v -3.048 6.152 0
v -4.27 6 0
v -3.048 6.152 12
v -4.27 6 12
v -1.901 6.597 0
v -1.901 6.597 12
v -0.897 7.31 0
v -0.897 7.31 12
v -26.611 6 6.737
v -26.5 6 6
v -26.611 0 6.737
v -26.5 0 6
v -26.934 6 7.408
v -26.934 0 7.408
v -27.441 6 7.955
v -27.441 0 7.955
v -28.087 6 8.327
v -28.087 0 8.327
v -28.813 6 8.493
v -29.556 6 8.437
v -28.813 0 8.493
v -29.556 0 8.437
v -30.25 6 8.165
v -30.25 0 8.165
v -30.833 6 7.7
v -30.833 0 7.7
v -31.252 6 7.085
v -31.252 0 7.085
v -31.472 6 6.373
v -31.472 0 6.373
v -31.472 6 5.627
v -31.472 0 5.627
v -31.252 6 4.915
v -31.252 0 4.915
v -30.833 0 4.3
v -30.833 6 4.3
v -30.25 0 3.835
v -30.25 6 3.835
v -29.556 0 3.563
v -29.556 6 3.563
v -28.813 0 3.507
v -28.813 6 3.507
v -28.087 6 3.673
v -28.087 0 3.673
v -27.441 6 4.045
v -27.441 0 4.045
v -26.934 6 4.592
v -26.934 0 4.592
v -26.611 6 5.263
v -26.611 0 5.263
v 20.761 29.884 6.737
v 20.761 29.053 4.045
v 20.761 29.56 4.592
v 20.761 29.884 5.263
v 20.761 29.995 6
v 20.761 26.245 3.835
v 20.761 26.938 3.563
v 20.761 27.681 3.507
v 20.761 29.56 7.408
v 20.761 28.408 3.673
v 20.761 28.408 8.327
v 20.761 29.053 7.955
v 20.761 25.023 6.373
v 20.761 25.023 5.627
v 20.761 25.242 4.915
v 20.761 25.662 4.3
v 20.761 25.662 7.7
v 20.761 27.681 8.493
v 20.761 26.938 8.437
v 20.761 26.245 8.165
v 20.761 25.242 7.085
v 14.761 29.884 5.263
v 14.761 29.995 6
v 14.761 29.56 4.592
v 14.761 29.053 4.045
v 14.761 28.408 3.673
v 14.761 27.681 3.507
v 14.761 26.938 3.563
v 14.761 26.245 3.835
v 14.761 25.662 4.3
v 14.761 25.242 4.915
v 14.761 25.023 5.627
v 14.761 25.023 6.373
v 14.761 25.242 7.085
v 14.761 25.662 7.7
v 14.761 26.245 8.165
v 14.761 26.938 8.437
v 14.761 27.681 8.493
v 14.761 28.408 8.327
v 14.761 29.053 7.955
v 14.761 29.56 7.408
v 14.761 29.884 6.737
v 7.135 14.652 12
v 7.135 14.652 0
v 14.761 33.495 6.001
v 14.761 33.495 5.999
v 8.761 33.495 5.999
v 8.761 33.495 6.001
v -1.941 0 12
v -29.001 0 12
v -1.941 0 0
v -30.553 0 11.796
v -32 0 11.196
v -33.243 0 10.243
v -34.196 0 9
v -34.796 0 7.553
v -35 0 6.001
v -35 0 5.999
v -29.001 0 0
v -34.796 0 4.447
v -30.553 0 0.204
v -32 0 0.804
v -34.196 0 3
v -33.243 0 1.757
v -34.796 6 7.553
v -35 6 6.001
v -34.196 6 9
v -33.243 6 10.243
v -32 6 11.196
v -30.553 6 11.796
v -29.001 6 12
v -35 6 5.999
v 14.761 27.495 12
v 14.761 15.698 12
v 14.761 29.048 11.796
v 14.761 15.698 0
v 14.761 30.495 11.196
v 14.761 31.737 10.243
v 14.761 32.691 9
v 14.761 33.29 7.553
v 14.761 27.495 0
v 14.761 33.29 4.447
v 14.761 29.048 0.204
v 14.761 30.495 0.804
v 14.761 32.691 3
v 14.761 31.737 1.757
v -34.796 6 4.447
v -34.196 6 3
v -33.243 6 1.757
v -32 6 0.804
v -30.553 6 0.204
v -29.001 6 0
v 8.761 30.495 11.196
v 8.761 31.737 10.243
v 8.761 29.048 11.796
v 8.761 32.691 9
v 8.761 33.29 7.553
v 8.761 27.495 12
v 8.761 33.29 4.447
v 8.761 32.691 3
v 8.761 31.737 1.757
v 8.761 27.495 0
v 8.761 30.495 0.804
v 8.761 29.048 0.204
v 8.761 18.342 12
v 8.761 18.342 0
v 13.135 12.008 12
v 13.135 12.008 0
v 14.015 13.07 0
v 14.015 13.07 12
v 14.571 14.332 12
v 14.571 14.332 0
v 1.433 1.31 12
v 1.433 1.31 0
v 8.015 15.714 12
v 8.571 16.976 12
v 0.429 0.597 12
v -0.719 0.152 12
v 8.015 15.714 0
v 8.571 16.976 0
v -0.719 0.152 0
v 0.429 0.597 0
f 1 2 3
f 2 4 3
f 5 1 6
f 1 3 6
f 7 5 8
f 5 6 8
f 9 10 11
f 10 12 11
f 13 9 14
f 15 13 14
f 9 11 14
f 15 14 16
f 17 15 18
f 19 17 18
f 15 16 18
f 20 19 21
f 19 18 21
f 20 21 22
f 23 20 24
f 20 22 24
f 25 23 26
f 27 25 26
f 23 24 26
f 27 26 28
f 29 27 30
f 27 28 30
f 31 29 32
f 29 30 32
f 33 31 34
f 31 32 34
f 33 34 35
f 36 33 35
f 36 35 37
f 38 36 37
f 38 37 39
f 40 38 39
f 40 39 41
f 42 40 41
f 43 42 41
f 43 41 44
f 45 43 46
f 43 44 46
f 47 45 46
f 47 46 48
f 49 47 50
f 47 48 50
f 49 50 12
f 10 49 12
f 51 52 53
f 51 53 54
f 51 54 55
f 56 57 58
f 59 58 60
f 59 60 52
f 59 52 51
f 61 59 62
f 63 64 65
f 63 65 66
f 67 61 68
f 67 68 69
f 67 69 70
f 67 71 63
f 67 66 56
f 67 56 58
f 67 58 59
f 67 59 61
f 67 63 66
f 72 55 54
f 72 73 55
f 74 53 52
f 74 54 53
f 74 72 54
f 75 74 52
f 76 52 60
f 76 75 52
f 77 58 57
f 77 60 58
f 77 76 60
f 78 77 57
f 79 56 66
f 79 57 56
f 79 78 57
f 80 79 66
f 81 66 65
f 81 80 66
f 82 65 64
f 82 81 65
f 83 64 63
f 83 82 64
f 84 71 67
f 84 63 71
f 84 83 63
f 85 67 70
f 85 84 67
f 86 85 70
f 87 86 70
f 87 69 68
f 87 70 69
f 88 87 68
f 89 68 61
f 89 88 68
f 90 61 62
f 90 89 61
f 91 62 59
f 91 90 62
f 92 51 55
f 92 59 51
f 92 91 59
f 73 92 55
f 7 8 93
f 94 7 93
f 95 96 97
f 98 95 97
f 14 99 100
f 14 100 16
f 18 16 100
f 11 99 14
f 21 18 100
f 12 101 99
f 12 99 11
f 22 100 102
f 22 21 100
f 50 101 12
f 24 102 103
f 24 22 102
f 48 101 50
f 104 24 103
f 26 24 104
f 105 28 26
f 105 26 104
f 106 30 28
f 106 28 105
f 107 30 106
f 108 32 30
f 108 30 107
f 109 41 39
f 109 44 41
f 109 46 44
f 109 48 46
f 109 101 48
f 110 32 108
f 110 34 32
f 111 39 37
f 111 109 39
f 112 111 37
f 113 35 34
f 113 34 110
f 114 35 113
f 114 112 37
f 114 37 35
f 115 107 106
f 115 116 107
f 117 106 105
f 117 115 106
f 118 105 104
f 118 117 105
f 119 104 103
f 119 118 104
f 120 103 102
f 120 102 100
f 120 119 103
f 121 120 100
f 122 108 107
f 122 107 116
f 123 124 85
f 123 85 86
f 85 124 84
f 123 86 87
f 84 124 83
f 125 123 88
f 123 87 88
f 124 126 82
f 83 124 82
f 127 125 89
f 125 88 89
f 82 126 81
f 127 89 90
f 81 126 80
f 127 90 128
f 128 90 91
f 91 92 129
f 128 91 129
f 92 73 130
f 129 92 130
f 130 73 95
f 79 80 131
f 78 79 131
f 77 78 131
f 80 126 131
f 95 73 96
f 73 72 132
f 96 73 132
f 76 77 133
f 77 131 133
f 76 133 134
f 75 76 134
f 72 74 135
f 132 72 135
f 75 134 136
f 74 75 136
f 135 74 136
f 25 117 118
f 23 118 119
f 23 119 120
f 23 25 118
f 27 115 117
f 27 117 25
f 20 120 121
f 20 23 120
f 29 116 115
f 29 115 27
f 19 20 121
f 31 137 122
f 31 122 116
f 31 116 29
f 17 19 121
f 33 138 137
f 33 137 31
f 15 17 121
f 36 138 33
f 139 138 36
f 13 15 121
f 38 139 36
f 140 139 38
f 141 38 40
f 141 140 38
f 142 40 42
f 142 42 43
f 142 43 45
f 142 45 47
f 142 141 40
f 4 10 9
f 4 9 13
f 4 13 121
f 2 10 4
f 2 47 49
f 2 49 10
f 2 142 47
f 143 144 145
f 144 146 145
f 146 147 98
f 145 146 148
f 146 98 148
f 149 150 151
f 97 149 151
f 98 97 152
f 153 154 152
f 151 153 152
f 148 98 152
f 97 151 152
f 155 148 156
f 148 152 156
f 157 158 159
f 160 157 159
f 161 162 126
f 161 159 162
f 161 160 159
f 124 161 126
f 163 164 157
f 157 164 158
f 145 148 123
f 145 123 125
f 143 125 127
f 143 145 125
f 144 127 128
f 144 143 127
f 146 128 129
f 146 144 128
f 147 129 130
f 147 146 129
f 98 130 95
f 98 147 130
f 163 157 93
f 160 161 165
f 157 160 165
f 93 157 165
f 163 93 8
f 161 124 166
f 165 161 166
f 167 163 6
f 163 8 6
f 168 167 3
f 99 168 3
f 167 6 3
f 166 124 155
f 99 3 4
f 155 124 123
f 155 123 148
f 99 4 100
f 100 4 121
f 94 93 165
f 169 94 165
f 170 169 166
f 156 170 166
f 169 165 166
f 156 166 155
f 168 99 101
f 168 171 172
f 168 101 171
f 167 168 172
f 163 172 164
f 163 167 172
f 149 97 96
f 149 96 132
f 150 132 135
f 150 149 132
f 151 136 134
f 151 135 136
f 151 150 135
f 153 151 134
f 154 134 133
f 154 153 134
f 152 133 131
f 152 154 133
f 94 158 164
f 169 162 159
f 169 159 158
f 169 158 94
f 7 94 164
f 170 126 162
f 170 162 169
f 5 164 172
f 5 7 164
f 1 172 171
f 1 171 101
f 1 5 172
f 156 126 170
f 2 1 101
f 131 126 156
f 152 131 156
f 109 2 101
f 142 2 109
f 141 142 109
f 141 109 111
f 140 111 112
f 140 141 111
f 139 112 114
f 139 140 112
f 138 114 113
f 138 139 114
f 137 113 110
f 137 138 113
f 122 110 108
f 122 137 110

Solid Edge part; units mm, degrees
sketch "Sketch1" plane through (0, 0, 0) normal (0, 0, 1) x (1, 0, 0)
  line L0 (-35, 6) -> (-2.3292, 6)
  line L1 (-2.3292, 6) -> (8.7613, 16.1389)
  line L2 (8.7613, 33.4946) -> (8.7613, 16.1389)
  line L3 (14.7613, 33.4946) -> (8.7613, 33.4946)
  line L4 (14.7613, 13.4946) -> (14.7613, 33.4946)
  line L5 (0, 0) -> (14.7613, 13.4946)
  line L6 (0, 0) -> (-35, 0)
  line L7 (-35, 0) -> (-35, 6)
extrude "Protrusion1" add sketch "Sketch1" along normal blind 12
fillet "Redondeo_1" radius 5 4 edges at (14.7613, 13.4946, 6) (0, 0, 6) (-2.3292, 6, 6) (8.7613, 16.1389, 6)
fillet "Redondeo_2" radius 6 4 edges at (11.7613, 33.4946, 12) (11.7613, 33.4946, 0) (-35, 3, 12) (-35, 3, 0)
sketch "Sketch2" plane through (-15.9705, 0, 6) normal (0, -1, 0) x (1, 0, 0)
  circle A0 centre (-13.0295, 0) radius 2.5
extrude "VaciadoExtruido_1" cut sketch "Sketch2" against normal blind 21.8267
sketch "Sketch3" plane through (14.7613, 24.5964, 6) normal (1, 0, 0) x (0, 1, 0)
  circle A0 centre (2.8982, 0) radius 2.5
extrude "VaciadoExtruido_2" cut sketch "Sketch3" against normal blind 18.7725
sketch "Sketch4" plane through (14.7613, 24.5964, 6) normal (1, 0, 0) x (0, 1, 0)
  circle A0 centre (2.8982, 0) radius 2.5
extrude "ProtrusiónExtruida_2" add sketch "Sketch4" along normal mid plane 12
sketch "Sketch5" plane through (14.7613, 24.5964, 6) normal (1, 0, 0) x (0, 1, 0)
  circle A0 centre (2.8982, 0) radius 2.5
extrude "VaciadoExtruido_3" cut sketch "Sketch5" along normal mid plane 37.0413
sketch "Sketch6" plane through (14.7613, 24.5964, 6) normal (1, 0, 0) x (0, 1, 0)
  circle A0 centre (2.8982, 0) radius 2.5
extrude "ProtrusiónExtruida_3" add sketch "Sketch6" along normal mid plane 12
